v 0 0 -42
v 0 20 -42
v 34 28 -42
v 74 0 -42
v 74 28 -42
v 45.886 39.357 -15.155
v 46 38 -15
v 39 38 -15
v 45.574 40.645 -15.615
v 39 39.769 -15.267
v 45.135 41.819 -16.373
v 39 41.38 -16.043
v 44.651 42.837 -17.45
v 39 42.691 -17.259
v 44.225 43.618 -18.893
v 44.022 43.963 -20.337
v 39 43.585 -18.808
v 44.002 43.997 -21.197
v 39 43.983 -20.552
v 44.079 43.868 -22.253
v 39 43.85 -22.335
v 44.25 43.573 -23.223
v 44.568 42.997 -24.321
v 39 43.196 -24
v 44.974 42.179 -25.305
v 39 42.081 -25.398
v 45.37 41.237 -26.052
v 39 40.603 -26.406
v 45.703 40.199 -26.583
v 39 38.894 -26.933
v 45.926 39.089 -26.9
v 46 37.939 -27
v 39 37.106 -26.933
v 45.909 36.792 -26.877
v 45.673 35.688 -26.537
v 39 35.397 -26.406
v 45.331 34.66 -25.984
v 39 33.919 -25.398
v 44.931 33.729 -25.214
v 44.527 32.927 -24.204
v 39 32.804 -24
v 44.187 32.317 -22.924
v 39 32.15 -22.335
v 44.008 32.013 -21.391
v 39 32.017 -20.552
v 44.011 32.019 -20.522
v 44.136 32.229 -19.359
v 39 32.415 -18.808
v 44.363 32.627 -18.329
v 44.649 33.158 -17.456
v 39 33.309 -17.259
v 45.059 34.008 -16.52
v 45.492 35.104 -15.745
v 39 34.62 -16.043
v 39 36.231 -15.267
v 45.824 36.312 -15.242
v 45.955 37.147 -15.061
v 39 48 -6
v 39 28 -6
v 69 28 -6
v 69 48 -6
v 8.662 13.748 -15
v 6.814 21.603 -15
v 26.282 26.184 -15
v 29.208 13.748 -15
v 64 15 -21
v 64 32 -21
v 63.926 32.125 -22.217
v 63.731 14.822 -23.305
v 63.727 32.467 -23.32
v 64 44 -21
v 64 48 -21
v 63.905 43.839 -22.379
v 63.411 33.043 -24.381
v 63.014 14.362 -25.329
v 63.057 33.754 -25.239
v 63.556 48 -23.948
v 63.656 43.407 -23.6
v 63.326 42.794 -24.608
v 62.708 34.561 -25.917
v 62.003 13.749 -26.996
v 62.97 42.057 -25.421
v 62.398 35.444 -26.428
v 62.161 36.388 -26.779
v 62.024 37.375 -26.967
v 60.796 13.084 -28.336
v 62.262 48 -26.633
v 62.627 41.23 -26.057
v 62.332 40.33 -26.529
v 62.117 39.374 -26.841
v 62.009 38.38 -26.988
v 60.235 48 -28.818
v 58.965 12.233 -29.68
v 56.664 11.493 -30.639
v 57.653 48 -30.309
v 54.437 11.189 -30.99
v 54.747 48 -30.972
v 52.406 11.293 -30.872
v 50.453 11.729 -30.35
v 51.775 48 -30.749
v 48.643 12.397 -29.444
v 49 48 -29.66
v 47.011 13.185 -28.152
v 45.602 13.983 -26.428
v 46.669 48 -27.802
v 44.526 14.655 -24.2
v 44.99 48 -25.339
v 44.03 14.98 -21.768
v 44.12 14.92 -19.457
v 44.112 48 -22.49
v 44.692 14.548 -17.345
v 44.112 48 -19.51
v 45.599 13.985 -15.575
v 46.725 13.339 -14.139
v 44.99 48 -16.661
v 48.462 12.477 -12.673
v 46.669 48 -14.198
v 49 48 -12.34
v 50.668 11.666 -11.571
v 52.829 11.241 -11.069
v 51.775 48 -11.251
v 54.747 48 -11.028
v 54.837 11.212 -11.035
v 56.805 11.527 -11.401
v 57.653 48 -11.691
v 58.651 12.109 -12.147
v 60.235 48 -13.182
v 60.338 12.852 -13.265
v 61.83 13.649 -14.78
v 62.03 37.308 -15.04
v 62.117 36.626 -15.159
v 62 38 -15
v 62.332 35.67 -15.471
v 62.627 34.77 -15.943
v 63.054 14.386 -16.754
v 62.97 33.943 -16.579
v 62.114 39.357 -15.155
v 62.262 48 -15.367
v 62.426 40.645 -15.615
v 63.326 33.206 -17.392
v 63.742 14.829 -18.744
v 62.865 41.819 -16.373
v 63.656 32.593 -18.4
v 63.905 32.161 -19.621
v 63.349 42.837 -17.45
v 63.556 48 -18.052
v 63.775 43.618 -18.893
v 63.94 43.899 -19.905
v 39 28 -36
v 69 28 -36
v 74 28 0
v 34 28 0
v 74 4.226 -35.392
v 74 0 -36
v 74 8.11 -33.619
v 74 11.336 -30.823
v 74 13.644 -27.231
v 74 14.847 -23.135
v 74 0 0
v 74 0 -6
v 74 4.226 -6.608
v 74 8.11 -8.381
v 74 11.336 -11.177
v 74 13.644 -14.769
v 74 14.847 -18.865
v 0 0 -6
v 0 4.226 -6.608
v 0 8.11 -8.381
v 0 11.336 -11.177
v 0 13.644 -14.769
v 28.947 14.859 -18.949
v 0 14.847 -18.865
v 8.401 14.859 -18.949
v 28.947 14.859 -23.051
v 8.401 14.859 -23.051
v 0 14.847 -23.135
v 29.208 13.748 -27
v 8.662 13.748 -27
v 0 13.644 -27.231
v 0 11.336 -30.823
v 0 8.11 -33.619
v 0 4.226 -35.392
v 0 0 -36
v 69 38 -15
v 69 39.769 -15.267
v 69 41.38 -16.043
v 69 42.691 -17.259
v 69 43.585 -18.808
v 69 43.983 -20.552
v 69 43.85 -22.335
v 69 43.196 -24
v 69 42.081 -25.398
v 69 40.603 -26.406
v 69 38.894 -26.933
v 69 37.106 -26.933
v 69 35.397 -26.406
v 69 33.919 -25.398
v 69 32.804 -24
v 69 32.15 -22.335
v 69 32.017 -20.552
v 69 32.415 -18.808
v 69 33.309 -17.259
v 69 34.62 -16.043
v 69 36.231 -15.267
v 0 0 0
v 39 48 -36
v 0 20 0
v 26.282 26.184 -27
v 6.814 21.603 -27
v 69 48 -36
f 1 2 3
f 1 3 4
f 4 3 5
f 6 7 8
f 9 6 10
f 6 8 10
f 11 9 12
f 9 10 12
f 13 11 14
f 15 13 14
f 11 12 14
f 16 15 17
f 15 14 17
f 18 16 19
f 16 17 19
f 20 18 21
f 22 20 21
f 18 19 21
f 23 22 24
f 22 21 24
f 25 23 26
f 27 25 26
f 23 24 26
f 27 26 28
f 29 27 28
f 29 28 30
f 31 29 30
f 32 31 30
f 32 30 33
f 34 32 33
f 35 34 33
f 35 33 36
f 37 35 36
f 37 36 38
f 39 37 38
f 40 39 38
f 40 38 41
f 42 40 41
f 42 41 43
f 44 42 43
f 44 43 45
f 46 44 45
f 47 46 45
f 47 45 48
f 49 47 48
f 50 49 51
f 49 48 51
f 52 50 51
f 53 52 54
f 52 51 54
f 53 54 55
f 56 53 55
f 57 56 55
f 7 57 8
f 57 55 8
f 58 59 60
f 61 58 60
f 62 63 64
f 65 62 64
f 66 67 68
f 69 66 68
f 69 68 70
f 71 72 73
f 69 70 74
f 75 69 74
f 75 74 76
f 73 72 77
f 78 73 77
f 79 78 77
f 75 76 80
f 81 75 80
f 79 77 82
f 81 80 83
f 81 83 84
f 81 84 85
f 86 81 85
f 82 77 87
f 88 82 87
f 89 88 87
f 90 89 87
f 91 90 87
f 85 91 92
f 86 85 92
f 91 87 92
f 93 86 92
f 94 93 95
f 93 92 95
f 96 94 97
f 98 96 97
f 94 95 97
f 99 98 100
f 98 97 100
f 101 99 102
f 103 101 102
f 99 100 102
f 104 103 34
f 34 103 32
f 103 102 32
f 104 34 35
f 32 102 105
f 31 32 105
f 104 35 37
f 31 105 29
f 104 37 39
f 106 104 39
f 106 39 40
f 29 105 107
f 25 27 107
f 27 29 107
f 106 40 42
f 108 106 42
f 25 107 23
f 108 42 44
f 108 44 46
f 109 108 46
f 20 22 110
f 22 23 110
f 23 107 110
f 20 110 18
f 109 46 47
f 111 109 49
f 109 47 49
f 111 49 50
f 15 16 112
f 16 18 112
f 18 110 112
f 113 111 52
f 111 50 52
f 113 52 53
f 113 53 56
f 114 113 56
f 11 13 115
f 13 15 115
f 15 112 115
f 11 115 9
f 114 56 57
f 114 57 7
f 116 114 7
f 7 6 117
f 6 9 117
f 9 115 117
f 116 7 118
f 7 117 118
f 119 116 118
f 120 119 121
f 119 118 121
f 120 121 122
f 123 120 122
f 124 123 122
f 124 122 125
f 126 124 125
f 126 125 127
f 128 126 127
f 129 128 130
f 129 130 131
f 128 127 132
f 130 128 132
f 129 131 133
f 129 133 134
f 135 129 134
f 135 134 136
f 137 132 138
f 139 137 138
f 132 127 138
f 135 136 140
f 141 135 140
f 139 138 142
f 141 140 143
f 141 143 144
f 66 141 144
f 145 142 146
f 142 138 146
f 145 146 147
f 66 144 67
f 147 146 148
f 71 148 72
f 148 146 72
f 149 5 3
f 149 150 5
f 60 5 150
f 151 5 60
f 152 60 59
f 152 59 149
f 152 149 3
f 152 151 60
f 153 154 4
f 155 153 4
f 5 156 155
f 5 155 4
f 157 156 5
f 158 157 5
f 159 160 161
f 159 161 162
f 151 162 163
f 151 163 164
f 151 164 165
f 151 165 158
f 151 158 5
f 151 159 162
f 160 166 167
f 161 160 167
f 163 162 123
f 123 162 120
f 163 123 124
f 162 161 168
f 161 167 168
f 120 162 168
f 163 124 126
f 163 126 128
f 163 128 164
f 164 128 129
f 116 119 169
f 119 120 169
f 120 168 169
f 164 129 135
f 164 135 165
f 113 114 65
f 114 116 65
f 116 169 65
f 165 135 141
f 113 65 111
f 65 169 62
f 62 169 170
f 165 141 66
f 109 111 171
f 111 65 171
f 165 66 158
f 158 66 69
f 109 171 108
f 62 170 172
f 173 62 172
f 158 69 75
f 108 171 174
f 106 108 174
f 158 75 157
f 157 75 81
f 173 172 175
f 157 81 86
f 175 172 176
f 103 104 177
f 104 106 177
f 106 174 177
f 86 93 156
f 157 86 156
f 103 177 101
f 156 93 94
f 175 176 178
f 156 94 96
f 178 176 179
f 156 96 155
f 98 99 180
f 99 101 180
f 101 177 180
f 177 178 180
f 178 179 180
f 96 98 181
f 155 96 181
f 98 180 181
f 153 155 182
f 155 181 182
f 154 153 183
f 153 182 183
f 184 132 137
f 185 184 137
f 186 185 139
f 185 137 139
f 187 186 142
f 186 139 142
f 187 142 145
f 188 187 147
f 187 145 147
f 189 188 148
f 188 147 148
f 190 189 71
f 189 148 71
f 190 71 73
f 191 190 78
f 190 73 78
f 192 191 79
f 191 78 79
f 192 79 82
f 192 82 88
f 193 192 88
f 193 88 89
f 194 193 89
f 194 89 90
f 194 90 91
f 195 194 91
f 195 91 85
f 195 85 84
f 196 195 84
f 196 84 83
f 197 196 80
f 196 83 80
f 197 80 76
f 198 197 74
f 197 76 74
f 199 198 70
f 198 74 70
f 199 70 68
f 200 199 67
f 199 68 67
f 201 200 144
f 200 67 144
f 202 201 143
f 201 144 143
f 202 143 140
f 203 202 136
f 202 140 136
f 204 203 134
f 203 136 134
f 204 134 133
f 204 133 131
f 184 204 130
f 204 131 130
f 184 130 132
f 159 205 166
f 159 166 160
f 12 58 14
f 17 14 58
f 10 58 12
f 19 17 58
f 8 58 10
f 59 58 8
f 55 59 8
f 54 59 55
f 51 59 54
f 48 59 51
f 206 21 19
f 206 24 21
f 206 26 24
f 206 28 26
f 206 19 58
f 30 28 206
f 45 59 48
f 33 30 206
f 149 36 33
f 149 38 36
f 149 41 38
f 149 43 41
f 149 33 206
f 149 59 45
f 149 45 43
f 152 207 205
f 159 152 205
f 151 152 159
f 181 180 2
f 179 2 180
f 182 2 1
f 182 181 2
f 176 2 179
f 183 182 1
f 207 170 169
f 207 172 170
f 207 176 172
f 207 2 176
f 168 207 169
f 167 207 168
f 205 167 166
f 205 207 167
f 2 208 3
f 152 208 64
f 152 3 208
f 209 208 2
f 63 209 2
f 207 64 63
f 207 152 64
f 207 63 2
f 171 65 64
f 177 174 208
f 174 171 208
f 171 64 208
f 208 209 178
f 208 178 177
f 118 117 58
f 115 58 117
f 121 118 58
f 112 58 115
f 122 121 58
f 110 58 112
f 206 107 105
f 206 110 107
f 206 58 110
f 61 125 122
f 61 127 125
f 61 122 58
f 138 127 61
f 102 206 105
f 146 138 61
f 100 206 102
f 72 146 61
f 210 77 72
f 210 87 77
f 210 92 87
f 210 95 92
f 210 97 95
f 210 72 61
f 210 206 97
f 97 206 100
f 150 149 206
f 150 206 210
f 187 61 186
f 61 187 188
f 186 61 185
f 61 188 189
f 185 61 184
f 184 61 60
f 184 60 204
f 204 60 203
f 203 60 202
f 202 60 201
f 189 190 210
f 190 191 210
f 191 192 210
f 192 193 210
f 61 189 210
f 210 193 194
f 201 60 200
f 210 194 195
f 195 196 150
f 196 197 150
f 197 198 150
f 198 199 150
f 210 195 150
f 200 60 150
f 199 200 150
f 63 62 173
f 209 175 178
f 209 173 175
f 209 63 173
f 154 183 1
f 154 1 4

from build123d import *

# Parameters (mm, degrees)
BOSS_EXTRUDE1_DEPTH = 42
SKETCH2_R           = 15
CUT_EXTRUDE1_DEPTH  = 74
SKETCH3_W           = 20
SKETCH3_H           = 12
CUT_EXTRUDE4_DEPTH  = 74
SKETCH4_W           = 30
SKETCH4_H           = 30
BOSS_EXTRUDE2_DEPTH = 20
SKETCH5_R           = 6
CUT_EXTRUDE5_DEPTH  = 30
SKETCH6_R           = 10
CUT_EXTRUDE6_DEPTH  = 40


with BuildPart() as part:
    # Sketch1 → Boss-Extrude1 (new body)
    with BuildSketch(Plane.XY):
        Polygon((0, 0), (74, 0), (74, 28), (34, 28), (0, 20), align=None)
    extrude(amount=-BOSS_EXTRUDE1_DEPTH)

    # Sketch2 → Cut-Extrude1 (cut)
    with BuildSketch(Plane.ZY):
        with Locations((-21, 0)):
            Circle(SKETCH2_R)
    extrude(amount=-CUT_EXTRUDE1_DEPTH, mode=Mode.SUBTRACT)

    # Sketch3 → Cut-Extrude4 (cut)
    with BuildSketch(Plane(origin=(-4.459016393, 18.950819672, 0), x_dir=(0.973417168, 0.229039334, 0), z_dir=(-0.229039334, 0.973417168, 0))):
        with Locations((21.580786675, 21)):
            Rectangle(SKETCH3_W, SKETCH3_H)
    extrude(amount=-CUT_EXTRUDE4_DEPTH, mode=Mode.SUBTRACT)

    # Sketch4 → Boss-Extrude2 (add)
    with BuildSketch(Plane(origin=(0, 28, 0), x_dir=(1, 0, 0), z_dir=(0, 1, 0))):
        with Locations((54, 21)):
            Rectangle(SKETCH4_W, SKETCH4_H)
    extrude(amount=BOSS_EXTRUDE2_DEPTH)

    # Sketch5 → Cut-Extrude5 (cut)
    with BuildSketch(Plane.ZY.offset(-39)):
        with Locations((-21, 38)):
            Circle(SKETCH5_R)
    extrude(amount=-CUT_EXTRUDE5_DEPTH, mode=Mode.SUBTRACT)

    # Sketch6 → Cut-Extrude6 (cut)
    with BuildSketch(Plane(origin=(0, 48, 0), x_dir=(1, 0, 0), z_dir=(0, 1, 0))):
        with Locations((54, 21)):
            Circle(SKETCH6_R)
    extrude(amount=-CUT_EXTRUDE6_DEPTH, mode=Mode.SUBTRACT)


solid = part.part
